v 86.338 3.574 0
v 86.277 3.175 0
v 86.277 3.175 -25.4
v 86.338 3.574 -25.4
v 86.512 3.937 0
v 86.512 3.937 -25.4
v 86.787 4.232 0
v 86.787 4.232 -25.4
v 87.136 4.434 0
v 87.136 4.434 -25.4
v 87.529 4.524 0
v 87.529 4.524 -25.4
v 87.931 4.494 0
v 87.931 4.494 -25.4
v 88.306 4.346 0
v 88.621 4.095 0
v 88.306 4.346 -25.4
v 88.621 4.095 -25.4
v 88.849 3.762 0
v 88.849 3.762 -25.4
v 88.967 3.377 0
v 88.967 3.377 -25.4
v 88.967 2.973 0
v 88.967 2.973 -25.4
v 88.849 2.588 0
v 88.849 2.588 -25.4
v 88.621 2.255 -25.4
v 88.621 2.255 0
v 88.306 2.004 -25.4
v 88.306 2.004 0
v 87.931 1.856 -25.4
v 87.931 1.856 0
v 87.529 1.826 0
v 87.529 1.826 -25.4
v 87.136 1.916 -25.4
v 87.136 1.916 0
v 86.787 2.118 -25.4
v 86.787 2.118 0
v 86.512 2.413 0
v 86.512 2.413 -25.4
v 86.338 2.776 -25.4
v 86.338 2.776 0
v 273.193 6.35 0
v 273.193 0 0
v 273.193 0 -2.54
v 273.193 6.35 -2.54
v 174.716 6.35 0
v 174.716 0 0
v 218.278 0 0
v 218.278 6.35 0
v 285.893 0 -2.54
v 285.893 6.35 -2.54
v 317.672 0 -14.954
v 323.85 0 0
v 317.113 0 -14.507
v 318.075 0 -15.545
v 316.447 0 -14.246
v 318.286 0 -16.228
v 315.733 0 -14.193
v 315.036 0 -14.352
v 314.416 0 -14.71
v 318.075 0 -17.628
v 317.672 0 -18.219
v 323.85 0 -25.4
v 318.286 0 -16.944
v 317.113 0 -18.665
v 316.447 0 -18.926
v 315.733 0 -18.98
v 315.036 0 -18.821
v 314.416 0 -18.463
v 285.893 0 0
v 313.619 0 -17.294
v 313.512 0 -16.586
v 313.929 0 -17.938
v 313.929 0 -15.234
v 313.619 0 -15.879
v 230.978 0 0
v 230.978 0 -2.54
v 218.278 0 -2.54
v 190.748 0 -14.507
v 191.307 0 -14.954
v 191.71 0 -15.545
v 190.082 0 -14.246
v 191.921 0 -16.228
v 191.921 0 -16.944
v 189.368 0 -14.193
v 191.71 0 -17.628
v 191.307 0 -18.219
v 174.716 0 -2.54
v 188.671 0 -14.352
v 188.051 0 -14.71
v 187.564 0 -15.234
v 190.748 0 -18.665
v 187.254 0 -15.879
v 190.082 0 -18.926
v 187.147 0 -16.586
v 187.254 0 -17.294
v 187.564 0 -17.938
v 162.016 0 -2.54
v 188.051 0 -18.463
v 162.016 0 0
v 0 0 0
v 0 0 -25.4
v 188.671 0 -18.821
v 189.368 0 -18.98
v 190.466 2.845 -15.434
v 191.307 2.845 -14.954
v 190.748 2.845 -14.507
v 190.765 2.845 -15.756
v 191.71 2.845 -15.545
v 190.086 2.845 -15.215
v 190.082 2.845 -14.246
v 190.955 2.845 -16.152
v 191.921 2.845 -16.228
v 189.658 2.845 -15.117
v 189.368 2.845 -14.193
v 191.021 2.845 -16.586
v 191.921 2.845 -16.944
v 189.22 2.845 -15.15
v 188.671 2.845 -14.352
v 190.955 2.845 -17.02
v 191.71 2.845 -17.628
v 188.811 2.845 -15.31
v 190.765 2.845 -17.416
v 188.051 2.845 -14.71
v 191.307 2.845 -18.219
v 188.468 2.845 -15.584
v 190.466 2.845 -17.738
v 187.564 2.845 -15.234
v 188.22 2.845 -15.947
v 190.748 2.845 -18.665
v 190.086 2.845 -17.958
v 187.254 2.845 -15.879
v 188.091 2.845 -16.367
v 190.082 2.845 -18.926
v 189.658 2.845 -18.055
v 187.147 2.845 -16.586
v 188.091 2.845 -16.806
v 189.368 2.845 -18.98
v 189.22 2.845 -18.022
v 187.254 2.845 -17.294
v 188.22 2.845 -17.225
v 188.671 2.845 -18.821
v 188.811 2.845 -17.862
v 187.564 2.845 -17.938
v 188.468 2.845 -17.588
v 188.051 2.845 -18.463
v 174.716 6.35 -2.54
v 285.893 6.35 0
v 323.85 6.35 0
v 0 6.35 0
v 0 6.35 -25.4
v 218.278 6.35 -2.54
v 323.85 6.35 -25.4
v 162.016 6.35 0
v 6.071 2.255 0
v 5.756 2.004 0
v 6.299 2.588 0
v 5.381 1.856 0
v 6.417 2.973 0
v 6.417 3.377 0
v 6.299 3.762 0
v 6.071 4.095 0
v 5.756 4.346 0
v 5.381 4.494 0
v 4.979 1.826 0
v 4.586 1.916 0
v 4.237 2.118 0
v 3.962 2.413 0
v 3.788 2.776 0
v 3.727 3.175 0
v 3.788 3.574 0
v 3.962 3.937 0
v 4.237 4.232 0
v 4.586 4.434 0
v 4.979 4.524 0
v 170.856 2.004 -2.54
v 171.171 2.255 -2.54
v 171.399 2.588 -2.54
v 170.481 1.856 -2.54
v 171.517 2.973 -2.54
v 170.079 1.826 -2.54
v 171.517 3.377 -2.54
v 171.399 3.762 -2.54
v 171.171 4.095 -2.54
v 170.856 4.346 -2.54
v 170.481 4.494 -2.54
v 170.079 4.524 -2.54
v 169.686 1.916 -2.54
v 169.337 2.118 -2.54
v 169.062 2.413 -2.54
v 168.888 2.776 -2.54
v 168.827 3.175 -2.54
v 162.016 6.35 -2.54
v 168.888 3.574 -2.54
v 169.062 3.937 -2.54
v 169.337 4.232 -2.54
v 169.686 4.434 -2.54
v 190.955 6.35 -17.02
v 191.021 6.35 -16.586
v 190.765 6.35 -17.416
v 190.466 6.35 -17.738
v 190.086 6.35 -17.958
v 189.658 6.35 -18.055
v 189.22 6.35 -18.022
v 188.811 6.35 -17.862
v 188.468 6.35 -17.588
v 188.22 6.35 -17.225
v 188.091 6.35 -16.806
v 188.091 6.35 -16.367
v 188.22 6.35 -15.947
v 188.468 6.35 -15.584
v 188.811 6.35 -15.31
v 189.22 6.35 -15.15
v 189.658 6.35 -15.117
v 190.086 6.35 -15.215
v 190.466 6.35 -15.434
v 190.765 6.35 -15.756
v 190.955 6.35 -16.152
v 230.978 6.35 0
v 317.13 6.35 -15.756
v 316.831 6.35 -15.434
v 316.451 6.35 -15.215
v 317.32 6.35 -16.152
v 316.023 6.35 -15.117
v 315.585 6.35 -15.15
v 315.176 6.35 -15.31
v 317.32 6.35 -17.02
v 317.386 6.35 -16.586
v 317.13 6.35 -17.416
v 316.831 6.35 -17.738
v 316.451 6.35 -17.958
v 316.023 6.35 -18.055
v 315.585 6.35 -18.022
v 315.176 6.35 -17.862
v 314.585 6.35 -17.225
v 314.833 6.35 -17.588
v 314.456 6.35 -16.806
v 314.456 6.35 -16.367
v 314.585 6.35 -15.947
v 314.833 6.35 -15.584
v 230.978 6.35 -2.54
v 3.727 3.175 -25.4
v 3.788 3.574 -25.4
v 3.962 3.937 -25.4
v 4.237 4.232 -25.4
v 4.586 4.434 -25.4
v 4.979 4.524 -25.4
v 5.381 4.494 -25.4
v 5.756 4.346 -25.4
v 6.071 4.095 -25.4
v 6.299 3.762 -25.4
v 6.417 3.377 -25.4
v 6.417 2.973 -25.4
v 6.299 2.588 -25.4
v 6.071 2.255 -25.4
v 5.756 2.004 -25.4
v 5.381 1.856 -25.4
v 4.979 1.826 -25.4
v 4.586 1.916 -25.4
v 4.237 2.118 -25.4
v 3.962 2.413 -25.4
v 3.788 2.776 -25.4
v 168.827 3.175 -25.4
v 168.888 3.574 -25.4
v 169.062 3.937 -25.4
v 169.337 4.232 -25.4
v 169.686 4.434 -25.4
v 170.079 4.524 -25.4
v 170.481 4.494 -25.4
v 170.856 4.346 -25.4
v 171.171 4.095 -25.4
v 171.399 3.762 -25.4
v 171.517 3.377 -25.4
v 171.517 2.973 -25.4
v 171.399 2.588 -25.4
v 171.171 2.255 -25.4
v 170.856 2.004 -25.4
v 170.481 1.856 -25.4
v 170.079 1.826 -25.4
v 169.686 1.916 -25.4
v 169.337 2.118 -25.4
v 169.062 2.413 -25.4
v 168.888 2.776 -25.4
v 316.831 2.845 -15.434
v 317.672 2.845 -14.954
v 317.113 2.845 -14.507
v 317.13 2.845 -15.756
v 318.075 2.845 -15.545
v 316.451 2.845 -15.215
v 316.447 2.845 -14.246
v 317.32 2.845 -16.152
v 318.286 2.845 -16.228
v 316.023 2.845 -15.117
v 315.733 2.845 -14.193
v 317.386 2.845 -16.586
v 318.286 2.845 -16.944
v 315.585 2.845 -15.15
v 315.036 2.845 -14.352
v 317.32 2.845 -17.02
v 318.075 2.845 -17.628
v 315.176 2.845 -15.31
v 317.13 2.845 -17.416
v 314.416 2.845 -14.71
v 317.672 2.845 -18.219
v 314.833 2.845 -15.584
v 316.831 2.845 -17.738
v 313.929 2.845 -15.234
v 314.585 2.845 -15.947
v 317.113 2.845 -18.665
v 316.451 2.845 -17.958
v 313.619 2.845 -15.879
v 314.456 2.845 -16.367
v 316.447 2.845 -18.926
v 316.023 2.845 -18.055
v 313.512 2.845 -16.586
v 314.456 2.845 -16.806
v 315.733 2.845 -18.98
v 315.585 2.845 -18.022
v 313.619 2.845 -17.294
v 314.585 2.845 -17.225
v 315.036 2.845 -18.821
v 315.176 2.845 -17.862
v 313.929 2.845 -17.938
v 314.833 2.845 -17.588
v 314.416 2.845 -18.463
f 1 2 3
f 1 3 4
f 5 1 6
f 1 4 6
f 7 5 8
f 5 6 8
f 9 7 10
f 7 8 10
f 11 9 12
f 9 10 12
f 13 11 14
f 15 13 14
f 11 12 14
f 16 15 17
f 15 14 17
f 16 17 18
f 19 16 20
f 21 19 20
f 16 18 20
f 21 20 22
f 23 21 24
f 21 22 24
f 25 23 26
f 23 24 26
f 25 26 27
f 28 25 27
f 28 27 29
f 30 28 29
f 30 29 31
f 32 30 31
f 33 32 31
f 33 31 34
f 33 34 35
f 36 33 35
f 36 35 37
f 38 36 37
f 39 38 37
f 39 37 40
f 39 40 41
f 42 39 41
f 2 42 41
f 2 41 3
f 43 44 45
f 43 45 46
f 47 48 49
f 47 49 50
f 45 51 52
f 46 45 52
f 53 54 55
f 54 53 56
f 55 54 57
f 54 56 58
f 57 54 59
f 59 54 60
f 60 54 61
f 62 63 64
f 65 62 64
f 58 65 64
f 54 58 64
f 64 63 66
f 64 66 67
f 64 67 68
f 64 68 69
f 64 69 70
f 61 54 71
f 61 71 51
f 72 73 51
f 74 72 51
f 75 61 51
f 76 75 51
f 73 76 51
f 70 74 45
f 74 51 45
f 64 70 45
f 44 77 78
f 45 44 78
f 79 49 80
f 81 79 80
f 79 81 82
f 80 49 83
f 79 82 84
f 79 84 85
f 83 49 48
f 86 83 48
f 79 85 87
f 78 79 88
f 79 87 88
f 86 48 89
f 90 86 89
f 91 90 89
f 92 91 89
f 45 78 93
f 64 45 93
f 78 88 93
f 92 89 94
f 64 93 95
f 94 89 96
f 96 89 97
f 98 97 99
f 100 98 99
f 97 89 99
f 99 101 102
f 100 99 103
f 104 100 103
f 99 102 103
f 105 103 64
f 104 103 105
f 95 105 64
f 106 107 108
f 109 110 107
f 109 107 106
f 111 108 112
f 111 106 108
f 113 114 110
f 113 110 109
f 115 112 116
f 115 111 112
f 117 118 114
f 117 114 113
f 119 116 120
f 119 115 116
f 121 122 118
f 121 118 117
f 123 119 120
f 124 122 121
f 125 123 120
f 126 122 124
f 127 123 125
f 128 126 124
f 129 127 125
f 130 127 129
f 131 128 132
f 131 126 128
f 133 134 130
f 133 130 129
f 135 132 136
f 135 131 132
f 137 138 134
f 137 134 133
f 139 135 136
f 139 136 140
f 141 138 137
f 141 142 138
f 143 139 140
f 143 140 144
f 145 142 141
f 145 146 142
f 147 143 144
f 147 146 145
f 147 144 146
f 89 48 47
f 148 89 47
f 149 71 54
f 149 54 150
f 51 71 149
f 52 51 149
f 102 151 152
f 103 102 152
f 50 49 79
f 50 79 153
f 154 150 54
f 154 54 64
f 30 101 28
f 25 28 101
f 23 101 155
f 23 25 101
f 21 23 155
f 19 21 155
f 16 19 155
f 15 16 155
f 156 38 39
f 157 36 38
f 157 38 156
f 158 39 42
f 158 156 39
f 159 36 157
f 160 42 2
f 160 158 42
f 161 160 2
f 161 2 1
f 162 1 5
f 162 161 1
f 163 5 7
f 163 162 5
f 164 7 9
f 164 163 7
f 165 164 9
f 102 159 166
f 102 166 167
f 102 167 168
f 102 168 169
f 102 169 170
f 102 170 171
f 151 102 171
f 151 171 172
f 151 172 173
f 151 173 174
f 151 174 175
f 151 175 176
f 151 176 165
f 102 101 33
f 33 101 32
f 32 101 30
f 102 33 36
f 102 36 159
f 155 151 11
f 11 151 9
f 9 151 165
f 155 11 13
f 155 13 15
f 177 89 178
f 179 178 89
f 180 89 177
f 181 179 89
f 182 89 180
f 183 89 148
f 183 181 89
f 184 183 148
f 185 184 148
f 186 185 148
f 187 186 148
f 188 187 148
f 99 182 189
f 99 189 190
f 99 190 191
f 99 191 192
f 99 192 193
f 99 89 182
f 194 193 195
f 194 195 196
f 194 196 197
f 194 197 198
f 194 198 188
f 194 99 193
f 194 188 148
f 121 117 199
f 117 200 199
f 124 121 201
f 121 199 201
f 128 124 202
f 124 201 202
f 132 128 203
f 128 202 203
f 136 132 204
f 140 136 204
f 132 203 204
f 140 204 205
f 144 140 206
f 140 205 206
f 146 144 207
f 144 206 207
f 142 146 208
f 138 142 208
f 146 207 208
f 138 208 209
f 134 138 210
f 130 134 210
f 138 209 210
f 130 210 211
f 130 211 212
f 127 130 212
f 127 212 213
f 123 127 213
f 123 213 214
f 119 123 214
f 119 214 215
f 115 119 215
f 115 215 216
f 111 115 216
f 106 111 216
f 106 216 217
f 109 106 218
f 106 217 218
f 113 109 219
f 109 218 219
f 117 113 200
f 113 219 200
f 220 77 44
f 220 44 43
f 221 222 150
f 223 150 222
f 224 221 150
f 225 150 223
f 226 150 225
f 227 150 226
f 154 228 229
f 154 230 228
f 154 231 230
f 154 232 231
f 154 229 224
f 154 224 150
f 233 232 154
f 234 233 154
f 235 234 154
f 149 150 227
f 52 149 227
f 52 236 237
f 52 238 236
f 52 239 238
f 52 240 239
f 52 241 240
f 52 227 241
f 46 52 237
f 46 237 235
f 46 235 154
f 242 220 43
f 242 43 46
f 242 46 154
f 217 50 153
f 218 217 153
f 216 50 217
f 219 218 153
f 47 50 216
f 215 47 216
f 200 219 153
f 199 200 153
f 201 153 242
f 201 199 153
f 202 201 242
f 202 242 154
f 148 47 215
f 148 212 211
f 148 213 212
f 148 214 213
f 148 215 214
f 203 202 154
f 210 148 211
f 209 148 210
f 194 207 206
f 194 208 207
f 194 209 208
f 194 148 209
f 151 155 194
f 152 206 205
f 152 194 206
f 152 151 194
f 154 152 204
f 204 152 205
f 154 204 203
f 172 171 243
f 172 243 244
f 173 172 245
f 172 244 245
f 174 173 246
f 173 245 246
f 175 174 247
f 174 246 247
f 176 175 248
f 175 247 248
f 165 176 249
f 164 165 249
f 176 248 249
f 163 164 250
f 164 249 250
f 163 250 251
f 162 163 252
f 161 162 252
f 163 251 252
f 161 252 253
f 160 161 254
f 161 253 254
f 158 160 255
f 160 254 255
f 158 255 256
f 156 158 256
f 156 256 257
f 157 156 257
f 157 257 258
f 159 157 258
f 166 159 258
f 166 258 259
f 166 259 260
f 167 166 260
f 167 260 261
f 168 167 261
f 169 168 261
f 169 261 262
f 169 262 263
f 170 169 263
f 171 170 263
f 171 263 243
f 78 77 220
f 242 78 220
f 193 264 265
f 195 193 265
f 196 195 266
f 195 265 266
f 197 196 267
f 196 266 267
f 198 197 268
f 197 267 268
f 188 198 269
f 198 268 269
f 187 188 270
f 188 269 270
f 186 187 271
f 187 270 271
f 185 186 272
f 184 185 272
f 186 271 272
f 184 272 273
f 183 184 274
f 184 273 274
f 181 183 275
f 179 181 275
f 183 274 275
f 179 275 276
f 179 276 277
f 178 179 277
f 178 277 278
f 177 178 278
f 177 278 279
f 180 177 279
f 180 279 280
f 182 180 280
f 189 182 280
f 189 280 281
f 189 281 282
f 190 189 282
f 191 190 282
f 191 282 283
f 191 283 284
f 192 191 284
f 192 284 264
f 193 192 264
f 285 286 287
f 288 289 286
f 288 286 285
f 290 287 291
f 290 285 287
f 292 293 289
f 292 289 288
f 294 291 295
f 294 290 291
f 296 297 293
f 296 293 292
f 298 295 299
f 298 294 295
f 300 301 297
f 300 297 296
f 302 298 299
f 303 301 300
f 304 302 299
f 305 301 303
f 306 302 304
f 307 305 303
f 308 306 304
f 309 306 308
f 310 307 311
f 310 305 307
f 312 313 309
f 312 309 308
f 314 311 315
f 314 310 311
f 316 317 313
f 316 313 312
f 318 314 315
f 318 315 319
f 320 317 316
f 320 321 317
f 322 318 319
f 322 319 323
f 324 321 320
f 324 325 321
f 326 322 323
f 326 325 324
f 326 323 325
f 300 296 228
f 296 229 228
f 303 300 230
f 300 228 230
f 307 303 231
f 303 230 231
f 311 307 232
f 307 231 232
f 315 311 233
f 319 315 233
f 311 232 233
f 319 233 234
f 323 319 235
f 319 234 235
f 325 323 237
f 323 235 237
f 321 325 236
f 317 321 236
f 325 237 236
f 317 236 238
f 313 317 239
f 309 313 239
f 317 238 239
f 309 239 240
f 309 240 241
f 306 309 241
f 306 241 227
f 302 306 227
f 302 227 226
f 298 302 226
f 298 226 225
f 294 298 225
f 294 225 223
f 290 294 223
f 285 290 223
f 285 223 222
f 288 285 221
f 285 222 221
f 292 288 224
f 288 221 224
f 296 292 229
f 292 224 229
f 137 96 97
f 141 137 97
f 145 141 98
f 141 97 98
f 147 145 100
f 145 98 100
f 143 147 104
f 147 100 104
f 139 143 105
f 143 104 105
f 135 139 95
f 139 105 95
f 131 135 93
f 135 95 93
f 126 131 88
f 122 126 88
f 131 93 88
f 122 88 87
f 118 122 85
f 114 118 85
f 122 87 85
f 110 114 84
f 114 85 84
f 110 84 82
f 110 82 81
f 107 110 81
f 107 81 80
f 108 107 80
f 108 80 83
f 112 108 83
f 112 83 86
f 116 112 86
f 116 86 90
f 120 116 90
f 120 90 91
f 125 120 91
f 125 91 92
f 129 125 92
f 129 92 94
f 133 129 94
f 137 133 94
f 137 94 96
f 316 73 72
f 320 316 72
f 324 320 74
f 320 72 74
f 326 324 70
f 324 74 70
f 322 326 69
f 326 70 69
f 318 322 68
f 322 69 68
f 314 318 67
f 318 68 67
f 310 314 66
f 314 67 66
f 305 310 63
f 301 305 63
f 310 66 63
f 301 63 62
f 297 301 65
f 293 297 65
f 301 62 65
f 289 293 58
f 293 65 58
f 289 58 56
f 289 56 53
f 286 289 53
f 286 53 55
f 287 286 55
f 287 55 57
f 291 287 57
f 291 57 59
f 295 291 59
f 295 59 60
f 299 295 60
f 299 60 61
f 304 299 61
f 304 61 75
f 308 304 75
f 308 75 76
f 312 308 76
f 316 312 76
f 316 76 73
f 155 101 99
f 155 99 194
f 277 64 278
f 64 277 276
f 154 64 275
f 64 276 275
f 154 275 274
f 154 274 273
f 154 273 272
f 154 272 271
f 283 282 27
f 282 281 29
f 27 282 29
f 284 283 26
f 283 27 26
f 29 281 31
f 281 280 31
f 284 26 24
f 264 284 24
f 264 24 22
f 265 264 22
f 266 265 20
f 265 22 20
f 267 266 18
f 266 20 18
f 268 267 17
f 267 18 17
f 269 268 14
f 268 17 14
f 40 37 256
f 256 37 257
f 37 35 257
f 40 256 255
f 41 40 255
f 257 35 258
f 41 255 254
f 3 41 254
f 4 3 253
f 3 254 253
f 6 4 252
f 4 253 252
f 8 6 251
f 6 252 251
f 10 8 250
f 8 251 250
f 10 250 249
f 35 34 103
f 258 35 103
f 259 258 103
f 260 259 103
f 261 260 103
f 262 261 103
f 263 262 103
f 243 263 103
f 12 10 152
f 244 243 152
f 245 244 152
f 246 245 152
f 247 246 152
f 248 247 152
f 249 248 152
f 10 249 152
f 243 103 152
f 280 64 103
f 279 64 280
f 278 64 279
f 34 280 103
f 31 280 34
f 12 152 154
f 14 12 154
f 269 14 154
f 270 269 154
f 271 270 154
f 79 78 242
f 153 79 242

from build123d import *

# Parameters (mm, degrees)
SKETCH1_W                                           = 25.4
SKETCH1_H                                           = 6.35
BOSS_EXTRUDE1_DEPTH                                 = 323.85
TAP_DRILL_FOR_6_32_TAP1_D                           = 2.7051
CBORE_FOR_4_BINDING_HEAD_MACHINE_SCREW2_D           = 2.9464
CBORE_FOR_4_BINDING_HEAD_MACHINE_SCREW2_CBORE_D     = 4.8006
CBORE_FOR_4_BINDING_HEAD_MACHINE_SCREW2_CBORE_DEPTH = 2.8448
SKETCH7_W                                           = 16.52236986
SKETCH7_H                                           = 12.7
SKETCH7_W_2                                         = 15.385295506
CUT_EXTRUDE2_DEPTH                                  = 2.54


with BuildPart() as part:
    # Sketch1 → Boss-Extrude1 (new body)
    with BuildSketch(Plane(origin=(0, 0, 0), x_dir=(0, 0, -1), z_dir=(1, 0, 0))):
        with Locations((12.7, 3.175)):
            Rectangle(SKETCH1_W, SKETCH1_H)
    extrude(amount=BOSS_EXTRUDE1_DEPTH)

    # Tap Drill for #6-32 Tap1 (through all)
    with Locations(Plane.XY):
        with Locations((5.08, 3.175), (87.63, 3.175), (170.18, 3.175)):
            Hole(TAP_DRILL_FOR_6_32_TAP1_D / 2)

    # CBORE for #4 Binding Head Machine Screw2 (through all)
    with Locations(Plane(origin=(0, 0, 0), x_dir=(-1, 0, 0), z_dir=(0, -1, 0))):
        with Locations((-315.9125, 16.5862), (-189.5475, 16.5862)):
            CounterBoreHole(CBORE_FOR_4_BINDING_HEAD_MACHINE_SCREW2_D / 2, CBORE_FOR_4_BINDING_HEAD_MACHINE_SCREW2_CBORE_D / 2, CBORE_FOR_4_BINDING_HEAD_MACHINE_SCREW2_CBORE_DEPTH)

    # Sketch7 → Cut-Extrude2 (cut)
    with BuildSketch(Plane(origin=(405.672488364, 78.178033599, 0), x_dir=(0, 1, 0), z_dir=(0, 0, 1))):
        with Locations((-76.963648836, 237.306121416)):
            Rectangle(SKETCH7_W, SKETCH7_H)
        with Locations((-77.090648836, 181.04446618)):
            Rectangle(SKETCH7_W_2, SKETCH7_H)
        with Locations((-77.090648836, 126.129362211)):
            Rectangle(SKETCH7_W_2, SKETCH7_H)
    extrude(amount=-CUT_EXTRUDE2_DEPTH, mode=Mode.SUBTRACT)


solid = part.part
